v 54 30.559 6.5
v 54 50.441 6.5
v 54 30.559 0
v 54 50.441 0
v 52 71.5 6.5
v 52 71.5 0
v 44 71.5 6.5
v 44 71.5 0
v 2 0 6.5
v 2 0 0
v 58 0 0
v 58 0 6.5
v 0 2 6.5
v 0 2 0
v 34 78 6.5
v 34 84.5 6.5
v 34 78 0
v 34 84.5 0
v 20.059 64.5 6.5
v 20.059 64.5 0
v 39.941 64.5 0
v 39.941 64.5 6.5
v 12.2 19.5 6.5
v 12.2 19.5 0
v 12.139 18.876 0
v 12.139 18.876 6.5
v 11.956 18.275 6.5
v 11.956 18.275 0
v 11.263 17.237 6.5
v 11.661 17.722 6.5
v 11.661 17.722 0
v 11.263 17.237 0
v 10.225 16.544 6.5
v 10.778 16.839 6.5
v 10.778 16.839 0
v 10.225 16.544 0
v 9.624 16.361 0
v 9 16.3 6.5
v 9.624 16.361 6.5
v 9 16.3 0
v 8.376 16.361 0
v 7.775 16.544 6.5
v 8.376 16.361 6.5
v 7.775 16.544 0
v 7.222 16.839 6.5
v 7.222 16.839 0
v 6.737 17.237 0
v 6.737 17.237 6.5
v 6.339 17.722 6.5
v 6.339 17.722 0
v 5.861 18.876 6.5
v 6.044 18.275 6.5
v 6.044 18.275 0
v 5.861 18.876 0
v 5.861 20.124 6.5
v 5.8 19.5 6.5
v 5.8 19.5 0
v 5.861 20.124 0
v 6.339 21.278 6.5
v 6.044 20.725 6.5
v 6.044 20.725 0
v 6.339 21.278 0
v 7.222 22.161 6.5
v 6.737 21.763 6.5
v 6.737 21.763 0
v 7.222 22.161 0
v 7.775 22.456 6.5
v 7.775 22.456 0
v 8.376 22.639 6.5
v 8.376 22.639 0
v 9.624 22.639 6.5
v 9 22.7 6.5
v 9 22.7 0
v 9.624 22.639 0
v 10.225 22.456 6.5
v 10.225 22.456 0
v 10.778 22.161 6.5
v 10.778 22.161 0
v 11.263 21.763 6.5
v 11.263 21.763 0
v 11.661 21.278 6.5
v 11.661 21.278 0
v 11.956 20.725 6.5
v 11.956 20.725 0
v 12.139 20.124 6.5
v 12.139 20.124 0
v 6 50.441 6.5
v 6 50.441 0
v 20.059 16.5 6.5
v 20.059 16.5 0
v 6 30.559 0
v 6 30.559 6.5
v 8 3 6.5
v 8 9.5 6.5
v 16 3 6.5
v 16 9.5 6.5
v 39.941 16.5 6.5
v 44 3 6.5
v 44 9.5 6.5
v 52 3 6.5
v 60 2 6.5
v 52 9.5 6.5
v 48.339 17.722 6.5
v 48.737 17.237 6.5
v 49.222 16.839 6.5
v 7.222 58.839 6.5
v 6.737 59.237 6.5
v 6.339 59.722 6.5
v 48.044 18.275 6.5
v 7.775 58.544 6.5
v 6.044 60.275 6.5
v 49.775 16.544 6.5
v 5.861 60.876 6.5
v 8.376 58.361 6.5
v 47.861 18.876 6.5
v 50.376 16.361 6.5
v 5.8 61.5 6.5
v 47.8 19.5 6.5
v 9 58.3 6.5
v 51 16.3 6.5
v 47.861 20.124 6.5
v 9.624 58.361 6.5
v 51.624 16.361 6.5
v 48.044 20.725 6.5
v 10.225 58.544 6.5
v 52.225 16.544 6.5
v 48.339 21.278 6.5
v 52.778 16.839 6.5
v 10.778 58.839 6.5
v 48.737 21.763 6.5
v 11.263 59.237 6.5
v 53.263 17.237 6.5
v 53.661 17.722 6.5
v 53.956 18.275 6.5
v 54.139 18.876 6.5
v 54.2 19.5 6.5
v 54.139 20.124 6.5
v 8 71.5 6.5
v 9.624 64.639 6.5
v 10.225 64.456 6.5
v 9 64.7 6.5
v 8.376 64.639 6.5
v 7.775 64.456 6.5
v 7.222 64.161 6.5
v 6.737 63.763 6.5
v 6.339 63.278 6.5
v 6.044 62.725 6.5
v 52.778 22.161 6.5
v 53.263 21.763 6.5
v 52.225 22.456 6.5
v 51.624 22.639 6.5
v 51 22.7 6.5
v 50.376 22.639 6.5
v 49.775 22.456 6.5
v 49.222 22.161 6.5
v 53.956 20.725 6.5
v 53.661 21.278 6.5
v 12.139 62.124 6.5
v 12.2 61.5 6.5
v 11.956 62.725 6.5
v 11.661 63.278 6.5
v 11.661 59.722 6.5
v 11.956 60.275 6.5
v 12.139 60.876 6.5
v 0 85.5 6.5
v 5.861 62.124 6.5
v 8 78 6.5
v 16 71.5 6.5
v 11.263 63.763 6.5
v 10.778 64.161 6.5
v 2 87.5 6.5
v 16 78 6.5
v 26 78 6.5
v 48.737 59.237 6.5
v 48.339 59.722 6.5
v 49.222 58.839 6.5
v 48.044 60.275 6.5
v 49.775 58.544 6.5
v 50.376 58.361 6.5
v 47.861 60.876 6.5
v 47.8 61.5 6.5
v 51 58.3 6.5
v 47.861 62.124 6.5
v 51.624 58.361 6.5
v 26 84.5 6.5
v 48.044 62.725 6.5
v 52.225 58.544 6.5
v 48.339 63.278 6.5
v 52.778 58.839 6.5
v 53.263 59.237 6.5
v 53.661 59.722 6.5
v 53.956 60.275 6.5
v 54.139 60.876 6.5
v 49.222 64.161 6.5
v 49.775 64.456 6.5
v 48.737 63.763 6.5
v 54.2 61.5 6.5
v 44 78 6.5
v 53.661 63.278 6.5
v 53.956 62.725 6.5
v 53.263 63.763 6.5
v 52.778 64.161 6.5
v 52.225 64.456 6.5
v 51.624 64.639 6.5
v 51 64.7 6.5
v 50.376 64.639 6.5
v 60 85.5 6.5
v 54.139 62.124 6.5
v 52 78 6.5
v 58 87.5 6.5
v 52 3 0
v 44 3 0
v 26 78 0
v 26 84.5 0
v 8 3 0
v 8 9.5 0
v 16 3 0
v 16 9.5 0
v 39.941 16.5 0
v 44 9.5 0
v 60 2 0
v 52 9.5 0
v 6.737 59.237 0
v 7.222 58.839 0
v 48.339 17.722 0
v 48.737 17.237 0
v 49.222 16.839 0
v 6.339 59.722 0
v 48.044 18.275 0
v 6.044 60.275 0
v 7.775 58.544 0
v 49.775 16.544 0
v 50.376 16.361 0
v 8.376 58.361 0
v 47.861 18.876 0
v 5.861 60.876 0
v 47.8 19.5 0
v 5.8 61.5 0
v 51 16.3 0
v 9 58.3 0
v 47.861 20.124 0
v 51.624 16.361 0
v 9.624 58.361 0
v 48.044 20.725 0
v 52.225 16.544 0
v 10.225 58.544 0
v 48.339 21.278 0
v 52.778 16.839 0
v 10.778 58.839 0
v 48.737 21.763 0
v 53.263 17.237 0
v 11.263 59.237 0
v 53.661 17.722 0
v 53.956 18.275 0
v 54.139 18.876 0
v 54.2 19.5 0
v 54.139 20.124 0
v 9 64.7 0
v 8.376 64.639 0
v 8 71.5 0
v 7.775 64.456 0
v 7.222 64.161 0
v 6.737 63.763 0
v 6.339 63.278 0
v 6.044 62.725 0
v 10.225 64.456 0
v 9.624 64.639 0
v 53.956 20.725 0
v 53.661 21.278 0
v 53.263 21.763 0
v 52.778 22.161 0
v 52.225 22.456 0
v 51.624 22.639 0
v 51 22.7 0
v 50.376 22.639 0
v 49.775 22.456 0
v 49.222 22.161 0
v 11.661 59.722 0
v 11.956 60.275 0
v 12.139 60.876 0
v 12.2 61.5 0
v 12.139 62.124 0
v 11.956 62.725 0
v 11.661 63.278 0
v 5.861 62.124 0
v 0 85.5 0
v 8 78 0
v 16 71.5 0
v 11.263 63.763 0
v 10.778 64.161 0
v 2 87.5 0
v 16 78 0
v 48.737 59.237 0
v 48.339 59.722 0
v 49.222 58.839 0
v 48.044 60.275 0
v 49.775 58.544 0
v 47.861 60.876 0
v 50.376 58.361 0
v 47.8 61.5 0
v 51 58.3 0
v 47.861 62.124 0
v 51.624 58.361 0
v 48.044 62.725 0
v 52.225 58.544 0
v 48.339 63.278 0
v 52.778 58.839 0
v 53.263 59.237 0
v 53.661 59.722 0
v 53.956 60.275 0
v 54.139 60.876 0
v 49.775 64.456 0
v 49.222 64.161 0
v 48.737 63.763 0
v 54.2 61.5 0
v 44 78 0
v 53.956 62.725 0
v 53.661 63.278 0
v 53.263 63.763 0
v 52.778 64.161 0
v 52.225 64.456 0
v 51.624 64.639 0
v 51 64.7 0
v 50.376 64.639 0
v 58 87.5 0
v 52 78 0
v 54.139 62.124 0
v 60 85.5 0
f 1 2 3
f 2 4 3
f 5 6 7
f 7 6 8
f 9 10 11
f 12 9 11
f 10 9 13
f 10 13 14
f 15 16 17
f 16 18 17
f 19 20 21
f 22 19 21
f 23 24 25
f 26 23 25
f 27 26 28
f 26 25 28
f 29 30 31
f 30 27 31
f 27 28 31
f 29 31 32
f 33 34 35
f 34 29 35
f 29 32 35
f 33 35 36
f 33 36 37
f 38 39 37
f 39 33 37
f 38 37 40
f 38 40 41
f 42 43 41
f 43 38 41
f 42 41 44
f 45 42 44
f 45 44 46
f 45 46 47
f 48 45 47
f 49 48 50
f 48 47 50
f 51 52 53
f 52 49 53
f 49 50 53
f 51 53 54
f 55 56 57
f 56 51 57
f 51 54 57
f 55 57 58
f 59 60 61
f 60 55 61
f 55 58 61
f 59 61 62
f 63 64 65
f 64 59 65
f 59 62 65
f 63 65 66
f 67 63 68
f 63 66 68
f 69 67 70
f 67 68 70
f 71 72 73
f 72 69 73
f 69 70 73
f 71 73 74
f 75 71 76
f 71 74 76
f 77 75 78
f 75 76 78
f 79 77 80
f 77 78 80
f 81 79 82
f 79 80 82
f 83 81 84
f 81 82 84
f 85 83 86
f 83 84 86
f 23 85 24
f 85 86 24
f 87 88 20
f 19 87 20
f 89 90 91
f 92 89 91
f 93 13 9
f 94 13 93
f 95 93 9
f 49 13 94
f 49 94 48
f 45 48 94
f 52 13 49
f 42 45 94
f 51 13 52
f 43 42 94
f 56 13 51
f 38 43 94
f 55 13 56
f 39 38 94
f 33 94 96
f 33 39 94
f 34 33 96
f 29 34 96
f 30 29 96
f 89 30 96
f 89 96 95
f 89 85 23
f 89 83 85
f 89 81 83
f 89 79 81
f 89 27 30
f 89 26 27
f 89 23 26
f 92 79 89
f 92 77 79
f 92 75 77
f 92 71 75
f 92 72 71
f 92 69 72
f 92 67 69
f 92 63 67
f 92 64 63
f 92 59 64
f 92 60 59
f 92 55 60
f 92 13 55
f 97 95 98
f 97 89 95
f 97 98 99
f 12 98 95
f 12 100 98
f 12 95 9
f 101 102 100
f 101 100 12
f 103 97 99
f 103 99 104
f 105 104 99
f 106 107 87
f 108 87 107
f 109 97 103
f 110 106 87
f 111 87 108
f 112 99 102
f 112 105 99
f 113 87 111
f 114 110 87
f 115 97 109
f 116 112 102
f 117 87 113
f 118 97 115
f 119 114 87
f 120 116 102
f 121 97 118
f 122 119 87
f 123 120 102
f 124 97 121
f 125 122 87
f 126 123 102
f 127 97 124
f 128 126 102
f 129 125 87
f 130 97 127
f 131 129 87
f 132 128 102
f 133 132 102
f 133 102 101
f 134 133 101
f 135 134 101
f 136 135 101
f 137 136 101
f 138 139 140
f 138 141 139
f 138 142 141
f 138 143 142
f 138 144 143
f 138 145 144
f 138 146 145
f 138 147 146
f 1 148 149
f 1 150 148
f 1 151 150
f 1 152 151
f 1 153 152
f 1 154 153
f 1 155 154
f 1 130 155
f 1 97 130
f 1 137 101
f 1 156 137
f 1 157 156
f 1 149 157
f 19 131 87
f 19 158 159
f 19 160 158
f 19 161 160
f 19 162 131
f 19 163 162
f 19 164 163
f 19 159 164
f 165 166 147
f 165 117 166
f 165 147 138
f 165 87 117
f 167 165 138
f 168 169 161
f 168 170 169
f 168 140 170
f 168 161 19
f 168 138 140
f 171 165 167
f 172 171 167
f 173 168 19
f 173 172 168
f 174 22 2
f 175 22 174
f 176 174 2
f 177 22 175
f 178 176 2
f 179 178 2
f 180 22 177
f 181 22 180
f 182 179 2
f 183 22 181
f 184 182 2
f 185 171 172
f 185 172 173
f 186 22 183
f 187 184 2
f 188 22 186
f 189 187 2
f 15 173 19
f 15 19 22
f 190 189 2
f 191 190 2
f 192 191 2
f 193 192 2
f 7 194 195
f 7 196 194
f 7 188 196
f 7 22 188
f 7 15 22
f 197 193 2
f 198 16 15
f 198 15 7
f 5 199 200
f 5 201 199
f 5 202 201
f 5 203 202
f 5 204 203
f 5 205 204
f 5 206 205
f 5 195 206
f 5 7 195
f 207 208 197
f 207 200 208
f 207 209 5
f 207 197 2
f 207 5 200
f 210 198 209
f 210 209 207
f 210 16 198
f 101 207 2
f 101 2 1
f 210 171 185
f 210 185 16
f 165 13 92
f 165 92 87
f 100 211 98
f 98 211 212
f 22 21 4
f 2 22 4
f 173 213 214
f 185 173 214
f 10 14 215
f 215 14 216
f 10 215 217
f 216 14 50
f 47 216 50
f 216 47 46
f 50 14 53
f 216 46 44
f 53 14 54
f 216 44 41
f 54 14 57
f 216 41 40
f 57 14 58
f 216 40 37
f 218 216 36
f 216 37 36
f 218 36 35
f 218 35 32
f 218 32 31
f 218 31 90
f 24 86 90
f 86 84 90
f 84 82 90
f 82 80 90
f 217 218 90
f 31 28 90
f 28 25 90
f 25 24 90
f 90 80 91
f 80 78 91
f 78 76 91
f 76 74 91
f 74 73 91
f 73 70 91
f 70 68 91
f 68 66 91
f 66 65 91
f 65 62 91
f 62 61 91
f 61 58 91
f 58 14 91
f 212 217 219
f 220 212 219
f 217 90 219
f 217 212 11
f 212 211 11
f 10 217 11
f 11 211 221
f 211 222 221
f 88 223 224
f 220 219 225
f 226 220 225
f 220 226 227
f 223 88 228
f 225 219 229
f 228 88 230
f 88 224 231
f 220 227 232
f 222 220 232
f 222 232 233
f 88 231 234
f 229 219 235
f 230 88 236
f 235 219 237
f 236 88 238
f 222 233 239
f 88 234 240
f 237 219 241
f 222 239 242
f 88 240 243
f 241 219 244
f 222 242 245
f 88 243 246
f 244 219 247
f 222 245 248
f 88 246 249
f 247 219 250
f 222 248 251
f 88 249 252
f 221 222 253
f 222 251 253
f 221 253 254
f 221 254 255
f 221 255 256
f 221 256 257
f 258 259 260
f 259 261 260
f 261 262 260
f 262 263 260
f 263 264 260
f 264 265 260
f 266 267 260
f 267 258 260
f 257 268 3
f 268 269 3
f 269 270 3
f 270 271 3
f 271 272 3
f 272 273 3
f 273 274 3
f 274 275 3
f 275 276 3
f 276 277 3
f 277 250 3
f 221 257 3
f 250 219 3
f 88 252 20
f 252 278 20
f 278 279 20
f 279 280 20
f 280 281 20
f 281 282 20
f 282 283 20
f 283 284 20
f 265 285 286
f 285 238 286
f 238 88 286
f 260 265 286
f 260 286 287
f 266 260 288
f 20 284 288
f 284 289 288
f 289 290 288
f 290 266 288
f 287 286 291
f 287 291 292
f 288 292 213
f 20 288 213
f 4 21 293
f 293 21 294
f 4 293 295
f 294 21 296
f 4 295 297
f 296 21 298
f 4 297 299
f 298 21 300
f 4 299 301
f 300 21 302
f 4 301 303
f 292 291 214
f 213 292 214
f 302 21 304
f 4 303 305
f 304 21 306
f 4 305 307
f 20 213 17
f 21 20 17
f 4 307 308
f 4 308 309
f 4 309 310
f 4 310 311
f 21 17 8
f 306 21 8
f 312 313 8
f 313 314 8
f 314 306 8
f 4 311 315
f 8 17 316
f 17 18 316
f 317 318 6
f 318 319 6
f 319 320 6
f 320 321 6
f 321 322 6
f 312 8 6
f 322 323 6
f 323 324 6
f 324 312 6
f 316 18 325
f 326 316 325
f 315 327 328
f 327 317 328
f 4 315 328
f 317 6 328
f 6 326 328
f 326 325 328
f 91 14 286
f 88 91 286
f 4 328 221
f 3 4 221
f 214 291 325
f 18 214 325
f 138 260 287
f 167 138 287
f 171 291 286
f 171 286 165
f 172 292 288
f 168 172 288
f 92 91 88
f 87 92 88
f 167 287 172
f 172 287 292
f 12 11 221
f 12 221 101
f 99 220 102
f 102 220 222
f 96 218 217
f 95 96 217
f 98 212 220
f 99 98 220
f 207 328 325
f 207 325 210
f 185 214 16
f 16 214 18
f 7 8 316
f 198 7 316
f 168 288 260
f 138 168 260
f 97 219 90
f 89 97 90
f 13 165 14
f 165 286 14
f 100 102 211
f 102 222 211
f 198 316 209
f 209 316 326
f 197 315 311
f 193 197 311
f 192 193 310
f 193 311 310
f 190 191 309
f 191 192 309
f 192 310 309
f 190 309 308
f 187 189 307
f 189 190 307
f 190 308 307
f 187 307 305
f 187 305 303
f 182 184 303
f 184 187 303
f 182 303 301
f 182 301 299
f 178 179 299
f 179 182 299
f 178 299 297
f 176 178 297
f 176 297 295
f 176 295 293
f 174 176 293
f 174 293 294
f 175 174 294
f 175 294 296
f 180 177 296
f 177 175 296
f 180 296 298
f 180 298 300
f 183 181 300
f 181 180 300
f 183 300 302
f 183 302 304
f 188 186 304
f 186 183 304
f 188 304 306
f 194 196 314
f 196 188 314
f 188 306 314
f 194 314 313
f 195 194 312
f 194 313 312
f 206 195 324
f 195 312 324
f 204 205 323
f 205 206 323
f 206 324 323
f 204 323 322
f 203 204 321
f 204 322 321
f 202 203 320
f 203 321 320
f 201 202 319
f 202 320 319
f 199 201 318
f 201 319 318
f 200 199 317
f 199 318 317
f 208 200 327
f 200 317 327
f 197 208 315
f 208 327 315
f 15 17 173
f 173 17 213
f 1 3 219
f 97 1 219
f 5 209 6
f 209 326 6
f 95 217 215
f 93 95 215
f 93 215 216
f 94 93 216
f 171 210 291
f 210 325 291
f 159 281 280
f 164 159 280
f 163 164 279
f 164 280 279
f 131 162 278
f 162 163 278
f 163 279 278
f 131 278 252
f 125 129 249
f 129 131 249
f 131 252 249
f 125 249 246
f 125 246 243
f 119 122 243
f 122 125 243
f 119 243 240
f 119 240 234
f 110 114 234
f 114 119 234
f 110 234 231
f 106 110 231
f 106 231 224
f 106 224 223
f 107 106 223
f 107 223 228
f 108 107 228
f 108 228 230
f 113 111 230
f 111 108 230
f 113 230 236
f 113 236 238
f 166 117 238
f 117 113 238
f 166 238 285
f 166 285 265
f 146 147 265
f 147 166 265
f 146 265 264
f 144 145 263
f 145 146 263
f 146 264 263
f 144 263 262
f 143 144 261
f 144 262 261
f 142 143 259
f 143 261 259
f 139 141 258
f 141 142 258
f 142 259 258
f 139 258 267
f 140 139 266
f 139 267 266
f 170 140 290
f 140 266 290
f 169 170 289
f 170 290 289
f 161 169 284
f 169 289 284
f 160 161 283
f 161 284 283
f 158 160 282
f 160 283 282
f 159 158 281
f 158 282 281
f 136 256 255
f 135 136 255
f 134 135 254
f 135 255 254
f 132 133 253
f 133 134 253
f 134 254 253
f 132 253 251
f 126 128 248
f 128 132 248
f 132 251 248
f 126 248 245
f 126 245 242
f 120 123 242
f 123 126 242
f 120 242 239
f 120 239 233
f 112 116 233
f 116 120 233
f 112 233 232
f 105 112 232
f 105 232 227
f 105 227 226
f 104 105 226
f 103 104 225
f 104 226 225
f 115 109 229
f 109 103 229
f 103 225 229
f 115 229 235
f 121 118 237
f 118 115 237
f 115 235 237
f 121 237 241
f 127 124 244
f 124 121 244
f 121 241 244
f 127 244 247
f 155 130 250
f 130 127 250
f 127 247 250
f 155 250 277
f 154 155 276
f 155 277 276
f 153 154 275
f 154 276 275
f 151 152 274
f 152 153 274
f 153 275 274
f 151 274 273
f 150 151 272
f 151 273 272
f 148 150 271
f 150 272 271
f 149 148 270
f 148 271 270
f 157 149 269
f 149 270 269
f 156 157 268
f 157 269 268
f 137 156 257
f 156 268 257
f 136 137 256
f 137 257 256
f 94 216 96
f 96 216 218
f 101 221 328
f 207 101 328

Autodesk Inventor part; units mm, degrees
ref_plane "YZ Plane" through (0, 0, 0) normal (1, 0, 0) x (0, 1, 0)
ref_plane "XZ Plane" through (0, 0, 0) normal (0, 1, 0) x (-1, 0, 0)
ref_plane "XY Plane" through (0, 0, 0) normal (0, 0, 1) x (1, 0, 0)
sketch "Sketch1" plane through (0, 0, 0) normal (0, 0, 1) x (1, 0, 0)
  line L0 (0, 0) -> (60, 0)
  line L1 (60, 0) -> (60, 87.5)
  line L2 (60, 87.5) -> (0, 87.5)
  line L3 (0, 87.5) -> (0, 0)
  line L4 (54, 30.5589) -> (39.9411, 16.5)
  line L5 (39.9411, 16.5) -> (20.0589, 16.5)
  line L6 (20.0589, 16.5) -> (6, 30.5589)
  line L7 (6, 30.5589) -> (6, 50.4411)
  line L8 (6, 50.4411) -> (20.0589, 64.5)
  line L9 (20.0589, 64.5) -> (39.9411, 64.5)
  line L10 (39.9411, 64.5) -> (54, 50.4411)
  line L11 (54, 50.4411) -> (54, 30.5589)
  line L12 (9, 61.5) -> (51, 61.5) construction
  line L13 (51, 61.5) -> (51, 19.5) construction
  line L14 (51, 19.5) -> (9, 19.5) construction
  line L15 (9, 19.5) -> (9, 61.5) construction
  circle A0 centre (9, 61.5) radius 3.2
  circle A1 centre (9, 19.5) radius 3.2
  circle A2 centre (51, 19.5) radius 3.2
  circle A3 centre (51, 61.5) radius 3.2
  line L16 (8, 9.5) -> (16, 9.5)
  line L17 (16, 9.5) -> (16, 3)
  line L18 (16, 3) -> (8, 3)
  line L19 (8, 3) -> (8, 9.5)
  line L20 (44, 9.5) -> (52, 9.5)
  line L21 (52, 9.5) -> (52, 3)
  line L22 (52, 3) -> (44, 3)
  line L23 (44, 3) -> (44, 9.5)
  line L24 (8, 78) -> (16, 78)
  line L25 (16, 78) -> (16, 71.5)
  line L26 (16, 71.5) -> (8, 71.5)
  line L27 (8, 71.5) -> (8, 78)
  line L28 (44, 78) -> (52, 78)
  line L29 (52, 78) -> (52, 71.5)
  line L30 (52, 71.5) -> (44, 71.5)
  line L31 (44, 71.5) -> (44, 78)
  line L32 (26, 84.5) -> (34, 84.5)
  line L33 (34, 84.5) -> (34, 78)
  line L34 (34, 78) -> (26, 78)
  line L35 (26, 78) -> (26, 84.5)
  line L36 (12, 71.5) -> (12, 9.5) construction
  point P0 (30, 40.5)
  point P1 (30, 61.5)
  point P2 (30, 64.5)
  point P3 (9, 40.5)
  point P4 (6, 40.5)
  point P5 (12, 40.5)
  point P6 (30, 78)
  dimension "d0" = 42
  dimension "d1" = 42
  dimension "d2" = 48
  dimension "d3" = 6.4
  dimension "d4" = 6.4
  dimension "d5" = 6.4
  dimension "d6" = 6.4
  dimension "d7" = 6.5
  dimension "d8" = 8
  dimension "d9" = 6.5
  dimension "d10" = 8
  dimension "d11" = 3
  dimension "d12" = 8
  dimension "d13" = 6.5
  dimension "d14" = 3
  dimension "d15" = 87.5
  dimension "d16" = 6
  dimension "d17" = 6
  dimension "d18" = 8
  dimension "d19" = 8
extrude "Extrusion1" add sketch "Sketch1" along normal blind 6.5
chamfer "Chamfer1" distance 2 angle 45 4 edges at (0, 0, 3.25) (60, 0, 3.25) (60, 87.5, 3.25) (0, 87.5, 3.25)
properties part number "x_iddler_c_mount"
